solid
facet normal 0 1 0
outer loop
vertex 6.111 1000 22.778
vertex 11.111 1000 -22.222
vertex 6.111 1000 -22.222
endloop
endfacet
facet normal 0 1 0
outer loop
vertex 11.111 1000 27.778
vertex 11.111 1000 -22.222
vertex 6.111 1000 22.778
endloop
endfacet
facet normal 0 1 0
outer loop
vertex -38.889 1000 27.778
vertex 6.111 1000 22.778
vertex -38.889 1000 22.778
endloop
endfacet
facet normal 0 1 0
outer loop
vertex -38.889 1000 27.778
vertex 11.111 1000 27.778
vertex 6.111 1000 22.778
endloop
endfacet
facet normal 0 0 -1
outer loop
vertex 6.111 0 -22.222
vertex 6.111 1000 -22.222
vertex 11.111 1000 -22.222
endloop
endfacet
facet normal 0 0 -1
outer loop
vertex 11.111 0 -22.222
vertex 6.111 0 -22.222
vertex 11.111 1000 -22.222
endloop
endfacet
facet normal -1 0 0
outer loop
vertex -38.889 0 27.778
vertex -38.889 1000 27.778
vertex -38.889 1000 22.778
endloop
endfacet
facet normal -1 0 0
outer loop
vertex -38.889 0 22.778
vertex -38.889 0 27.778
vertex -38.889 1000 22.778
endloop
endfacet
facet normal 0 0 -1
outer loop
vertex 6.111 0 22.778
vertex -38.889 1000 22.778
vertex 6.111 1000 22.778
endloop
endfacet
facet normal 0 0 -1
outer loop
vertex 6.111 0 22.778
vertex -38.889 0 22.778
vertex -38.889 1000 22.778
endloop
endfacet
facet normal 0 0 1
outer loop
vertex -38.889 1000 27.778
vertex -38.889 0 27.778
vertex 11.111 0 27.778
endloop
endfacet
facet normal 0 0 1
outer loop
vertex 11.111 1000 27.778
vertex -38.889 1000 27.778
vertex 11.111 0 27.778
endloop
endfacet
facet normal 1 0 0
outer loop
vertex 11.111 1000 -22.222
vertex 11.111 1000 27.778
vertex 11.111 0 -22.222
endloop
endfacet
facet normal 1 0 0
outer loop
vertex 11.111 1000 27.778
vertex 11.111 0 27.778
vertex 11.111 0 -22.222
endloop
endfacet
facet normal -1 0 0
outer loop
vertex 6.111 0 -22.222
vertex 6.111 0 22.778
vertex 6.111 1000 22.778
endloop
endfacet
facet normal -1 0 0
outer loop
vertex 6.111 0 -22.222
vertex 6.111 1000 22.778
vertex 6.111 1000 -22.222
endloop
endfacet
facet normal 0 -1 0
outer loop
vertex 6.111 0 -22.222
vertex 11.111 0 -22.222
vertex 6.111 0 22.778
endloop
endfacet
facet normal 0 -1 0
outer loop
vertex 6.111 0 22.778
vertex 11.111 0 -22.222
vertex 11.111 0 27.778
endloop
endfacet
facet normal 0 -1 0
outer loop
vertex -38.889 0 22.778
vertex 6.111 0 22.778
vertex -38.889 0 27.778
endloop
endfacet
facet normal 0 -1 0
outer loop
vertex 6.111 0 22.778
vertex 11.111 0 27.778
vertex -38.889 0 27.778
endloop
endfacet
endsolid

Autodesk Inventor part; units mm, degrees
ref_plane "YZ Plane" through (0, 0, 0) normal (1, 0, 0) x (0, 1, 0)
ref_plane "XZ Plane" through (0, 0, 0) normal (0, 1, 0) x (-1, 0, 0)
ref_plane "XY Plane" through (0, 0, 0) normal (0, 0, 1) x (1, 0, 0)
sketch "Sketch1" plane through (0, 0, 0) normal (0, 1, 0) x (-1, 0, 0)
  line L0 (38.8889, 27.7778) -> (-11.1111, 27.7778)
  line L1 (-11.1111, 27.7778) -> (-11.1111, -22.2222)
  line L2 (38.8889, 27.7778) -> (38.8889, 22.7778)
  line L3 (38.8889, 22.7778) -> (-6.1111, 22.7778)
  line L4 (-6.1111, 22.7778) -> (-6.1111, -22.2222)
  line L5 (-6.1111, -22.2222) -> (-11.1111, -22.2222)
  point P0 (0, 0)
  dimension "d0" = 50
  dimension "d1" = 50
  dimension "d2" = 5
  dimension "d3" = 5
extrude "Extrusion1" add sketch "Sketch1" along normal blind 1000
properties part number "Ugol800" material "Aluminum 6061"
